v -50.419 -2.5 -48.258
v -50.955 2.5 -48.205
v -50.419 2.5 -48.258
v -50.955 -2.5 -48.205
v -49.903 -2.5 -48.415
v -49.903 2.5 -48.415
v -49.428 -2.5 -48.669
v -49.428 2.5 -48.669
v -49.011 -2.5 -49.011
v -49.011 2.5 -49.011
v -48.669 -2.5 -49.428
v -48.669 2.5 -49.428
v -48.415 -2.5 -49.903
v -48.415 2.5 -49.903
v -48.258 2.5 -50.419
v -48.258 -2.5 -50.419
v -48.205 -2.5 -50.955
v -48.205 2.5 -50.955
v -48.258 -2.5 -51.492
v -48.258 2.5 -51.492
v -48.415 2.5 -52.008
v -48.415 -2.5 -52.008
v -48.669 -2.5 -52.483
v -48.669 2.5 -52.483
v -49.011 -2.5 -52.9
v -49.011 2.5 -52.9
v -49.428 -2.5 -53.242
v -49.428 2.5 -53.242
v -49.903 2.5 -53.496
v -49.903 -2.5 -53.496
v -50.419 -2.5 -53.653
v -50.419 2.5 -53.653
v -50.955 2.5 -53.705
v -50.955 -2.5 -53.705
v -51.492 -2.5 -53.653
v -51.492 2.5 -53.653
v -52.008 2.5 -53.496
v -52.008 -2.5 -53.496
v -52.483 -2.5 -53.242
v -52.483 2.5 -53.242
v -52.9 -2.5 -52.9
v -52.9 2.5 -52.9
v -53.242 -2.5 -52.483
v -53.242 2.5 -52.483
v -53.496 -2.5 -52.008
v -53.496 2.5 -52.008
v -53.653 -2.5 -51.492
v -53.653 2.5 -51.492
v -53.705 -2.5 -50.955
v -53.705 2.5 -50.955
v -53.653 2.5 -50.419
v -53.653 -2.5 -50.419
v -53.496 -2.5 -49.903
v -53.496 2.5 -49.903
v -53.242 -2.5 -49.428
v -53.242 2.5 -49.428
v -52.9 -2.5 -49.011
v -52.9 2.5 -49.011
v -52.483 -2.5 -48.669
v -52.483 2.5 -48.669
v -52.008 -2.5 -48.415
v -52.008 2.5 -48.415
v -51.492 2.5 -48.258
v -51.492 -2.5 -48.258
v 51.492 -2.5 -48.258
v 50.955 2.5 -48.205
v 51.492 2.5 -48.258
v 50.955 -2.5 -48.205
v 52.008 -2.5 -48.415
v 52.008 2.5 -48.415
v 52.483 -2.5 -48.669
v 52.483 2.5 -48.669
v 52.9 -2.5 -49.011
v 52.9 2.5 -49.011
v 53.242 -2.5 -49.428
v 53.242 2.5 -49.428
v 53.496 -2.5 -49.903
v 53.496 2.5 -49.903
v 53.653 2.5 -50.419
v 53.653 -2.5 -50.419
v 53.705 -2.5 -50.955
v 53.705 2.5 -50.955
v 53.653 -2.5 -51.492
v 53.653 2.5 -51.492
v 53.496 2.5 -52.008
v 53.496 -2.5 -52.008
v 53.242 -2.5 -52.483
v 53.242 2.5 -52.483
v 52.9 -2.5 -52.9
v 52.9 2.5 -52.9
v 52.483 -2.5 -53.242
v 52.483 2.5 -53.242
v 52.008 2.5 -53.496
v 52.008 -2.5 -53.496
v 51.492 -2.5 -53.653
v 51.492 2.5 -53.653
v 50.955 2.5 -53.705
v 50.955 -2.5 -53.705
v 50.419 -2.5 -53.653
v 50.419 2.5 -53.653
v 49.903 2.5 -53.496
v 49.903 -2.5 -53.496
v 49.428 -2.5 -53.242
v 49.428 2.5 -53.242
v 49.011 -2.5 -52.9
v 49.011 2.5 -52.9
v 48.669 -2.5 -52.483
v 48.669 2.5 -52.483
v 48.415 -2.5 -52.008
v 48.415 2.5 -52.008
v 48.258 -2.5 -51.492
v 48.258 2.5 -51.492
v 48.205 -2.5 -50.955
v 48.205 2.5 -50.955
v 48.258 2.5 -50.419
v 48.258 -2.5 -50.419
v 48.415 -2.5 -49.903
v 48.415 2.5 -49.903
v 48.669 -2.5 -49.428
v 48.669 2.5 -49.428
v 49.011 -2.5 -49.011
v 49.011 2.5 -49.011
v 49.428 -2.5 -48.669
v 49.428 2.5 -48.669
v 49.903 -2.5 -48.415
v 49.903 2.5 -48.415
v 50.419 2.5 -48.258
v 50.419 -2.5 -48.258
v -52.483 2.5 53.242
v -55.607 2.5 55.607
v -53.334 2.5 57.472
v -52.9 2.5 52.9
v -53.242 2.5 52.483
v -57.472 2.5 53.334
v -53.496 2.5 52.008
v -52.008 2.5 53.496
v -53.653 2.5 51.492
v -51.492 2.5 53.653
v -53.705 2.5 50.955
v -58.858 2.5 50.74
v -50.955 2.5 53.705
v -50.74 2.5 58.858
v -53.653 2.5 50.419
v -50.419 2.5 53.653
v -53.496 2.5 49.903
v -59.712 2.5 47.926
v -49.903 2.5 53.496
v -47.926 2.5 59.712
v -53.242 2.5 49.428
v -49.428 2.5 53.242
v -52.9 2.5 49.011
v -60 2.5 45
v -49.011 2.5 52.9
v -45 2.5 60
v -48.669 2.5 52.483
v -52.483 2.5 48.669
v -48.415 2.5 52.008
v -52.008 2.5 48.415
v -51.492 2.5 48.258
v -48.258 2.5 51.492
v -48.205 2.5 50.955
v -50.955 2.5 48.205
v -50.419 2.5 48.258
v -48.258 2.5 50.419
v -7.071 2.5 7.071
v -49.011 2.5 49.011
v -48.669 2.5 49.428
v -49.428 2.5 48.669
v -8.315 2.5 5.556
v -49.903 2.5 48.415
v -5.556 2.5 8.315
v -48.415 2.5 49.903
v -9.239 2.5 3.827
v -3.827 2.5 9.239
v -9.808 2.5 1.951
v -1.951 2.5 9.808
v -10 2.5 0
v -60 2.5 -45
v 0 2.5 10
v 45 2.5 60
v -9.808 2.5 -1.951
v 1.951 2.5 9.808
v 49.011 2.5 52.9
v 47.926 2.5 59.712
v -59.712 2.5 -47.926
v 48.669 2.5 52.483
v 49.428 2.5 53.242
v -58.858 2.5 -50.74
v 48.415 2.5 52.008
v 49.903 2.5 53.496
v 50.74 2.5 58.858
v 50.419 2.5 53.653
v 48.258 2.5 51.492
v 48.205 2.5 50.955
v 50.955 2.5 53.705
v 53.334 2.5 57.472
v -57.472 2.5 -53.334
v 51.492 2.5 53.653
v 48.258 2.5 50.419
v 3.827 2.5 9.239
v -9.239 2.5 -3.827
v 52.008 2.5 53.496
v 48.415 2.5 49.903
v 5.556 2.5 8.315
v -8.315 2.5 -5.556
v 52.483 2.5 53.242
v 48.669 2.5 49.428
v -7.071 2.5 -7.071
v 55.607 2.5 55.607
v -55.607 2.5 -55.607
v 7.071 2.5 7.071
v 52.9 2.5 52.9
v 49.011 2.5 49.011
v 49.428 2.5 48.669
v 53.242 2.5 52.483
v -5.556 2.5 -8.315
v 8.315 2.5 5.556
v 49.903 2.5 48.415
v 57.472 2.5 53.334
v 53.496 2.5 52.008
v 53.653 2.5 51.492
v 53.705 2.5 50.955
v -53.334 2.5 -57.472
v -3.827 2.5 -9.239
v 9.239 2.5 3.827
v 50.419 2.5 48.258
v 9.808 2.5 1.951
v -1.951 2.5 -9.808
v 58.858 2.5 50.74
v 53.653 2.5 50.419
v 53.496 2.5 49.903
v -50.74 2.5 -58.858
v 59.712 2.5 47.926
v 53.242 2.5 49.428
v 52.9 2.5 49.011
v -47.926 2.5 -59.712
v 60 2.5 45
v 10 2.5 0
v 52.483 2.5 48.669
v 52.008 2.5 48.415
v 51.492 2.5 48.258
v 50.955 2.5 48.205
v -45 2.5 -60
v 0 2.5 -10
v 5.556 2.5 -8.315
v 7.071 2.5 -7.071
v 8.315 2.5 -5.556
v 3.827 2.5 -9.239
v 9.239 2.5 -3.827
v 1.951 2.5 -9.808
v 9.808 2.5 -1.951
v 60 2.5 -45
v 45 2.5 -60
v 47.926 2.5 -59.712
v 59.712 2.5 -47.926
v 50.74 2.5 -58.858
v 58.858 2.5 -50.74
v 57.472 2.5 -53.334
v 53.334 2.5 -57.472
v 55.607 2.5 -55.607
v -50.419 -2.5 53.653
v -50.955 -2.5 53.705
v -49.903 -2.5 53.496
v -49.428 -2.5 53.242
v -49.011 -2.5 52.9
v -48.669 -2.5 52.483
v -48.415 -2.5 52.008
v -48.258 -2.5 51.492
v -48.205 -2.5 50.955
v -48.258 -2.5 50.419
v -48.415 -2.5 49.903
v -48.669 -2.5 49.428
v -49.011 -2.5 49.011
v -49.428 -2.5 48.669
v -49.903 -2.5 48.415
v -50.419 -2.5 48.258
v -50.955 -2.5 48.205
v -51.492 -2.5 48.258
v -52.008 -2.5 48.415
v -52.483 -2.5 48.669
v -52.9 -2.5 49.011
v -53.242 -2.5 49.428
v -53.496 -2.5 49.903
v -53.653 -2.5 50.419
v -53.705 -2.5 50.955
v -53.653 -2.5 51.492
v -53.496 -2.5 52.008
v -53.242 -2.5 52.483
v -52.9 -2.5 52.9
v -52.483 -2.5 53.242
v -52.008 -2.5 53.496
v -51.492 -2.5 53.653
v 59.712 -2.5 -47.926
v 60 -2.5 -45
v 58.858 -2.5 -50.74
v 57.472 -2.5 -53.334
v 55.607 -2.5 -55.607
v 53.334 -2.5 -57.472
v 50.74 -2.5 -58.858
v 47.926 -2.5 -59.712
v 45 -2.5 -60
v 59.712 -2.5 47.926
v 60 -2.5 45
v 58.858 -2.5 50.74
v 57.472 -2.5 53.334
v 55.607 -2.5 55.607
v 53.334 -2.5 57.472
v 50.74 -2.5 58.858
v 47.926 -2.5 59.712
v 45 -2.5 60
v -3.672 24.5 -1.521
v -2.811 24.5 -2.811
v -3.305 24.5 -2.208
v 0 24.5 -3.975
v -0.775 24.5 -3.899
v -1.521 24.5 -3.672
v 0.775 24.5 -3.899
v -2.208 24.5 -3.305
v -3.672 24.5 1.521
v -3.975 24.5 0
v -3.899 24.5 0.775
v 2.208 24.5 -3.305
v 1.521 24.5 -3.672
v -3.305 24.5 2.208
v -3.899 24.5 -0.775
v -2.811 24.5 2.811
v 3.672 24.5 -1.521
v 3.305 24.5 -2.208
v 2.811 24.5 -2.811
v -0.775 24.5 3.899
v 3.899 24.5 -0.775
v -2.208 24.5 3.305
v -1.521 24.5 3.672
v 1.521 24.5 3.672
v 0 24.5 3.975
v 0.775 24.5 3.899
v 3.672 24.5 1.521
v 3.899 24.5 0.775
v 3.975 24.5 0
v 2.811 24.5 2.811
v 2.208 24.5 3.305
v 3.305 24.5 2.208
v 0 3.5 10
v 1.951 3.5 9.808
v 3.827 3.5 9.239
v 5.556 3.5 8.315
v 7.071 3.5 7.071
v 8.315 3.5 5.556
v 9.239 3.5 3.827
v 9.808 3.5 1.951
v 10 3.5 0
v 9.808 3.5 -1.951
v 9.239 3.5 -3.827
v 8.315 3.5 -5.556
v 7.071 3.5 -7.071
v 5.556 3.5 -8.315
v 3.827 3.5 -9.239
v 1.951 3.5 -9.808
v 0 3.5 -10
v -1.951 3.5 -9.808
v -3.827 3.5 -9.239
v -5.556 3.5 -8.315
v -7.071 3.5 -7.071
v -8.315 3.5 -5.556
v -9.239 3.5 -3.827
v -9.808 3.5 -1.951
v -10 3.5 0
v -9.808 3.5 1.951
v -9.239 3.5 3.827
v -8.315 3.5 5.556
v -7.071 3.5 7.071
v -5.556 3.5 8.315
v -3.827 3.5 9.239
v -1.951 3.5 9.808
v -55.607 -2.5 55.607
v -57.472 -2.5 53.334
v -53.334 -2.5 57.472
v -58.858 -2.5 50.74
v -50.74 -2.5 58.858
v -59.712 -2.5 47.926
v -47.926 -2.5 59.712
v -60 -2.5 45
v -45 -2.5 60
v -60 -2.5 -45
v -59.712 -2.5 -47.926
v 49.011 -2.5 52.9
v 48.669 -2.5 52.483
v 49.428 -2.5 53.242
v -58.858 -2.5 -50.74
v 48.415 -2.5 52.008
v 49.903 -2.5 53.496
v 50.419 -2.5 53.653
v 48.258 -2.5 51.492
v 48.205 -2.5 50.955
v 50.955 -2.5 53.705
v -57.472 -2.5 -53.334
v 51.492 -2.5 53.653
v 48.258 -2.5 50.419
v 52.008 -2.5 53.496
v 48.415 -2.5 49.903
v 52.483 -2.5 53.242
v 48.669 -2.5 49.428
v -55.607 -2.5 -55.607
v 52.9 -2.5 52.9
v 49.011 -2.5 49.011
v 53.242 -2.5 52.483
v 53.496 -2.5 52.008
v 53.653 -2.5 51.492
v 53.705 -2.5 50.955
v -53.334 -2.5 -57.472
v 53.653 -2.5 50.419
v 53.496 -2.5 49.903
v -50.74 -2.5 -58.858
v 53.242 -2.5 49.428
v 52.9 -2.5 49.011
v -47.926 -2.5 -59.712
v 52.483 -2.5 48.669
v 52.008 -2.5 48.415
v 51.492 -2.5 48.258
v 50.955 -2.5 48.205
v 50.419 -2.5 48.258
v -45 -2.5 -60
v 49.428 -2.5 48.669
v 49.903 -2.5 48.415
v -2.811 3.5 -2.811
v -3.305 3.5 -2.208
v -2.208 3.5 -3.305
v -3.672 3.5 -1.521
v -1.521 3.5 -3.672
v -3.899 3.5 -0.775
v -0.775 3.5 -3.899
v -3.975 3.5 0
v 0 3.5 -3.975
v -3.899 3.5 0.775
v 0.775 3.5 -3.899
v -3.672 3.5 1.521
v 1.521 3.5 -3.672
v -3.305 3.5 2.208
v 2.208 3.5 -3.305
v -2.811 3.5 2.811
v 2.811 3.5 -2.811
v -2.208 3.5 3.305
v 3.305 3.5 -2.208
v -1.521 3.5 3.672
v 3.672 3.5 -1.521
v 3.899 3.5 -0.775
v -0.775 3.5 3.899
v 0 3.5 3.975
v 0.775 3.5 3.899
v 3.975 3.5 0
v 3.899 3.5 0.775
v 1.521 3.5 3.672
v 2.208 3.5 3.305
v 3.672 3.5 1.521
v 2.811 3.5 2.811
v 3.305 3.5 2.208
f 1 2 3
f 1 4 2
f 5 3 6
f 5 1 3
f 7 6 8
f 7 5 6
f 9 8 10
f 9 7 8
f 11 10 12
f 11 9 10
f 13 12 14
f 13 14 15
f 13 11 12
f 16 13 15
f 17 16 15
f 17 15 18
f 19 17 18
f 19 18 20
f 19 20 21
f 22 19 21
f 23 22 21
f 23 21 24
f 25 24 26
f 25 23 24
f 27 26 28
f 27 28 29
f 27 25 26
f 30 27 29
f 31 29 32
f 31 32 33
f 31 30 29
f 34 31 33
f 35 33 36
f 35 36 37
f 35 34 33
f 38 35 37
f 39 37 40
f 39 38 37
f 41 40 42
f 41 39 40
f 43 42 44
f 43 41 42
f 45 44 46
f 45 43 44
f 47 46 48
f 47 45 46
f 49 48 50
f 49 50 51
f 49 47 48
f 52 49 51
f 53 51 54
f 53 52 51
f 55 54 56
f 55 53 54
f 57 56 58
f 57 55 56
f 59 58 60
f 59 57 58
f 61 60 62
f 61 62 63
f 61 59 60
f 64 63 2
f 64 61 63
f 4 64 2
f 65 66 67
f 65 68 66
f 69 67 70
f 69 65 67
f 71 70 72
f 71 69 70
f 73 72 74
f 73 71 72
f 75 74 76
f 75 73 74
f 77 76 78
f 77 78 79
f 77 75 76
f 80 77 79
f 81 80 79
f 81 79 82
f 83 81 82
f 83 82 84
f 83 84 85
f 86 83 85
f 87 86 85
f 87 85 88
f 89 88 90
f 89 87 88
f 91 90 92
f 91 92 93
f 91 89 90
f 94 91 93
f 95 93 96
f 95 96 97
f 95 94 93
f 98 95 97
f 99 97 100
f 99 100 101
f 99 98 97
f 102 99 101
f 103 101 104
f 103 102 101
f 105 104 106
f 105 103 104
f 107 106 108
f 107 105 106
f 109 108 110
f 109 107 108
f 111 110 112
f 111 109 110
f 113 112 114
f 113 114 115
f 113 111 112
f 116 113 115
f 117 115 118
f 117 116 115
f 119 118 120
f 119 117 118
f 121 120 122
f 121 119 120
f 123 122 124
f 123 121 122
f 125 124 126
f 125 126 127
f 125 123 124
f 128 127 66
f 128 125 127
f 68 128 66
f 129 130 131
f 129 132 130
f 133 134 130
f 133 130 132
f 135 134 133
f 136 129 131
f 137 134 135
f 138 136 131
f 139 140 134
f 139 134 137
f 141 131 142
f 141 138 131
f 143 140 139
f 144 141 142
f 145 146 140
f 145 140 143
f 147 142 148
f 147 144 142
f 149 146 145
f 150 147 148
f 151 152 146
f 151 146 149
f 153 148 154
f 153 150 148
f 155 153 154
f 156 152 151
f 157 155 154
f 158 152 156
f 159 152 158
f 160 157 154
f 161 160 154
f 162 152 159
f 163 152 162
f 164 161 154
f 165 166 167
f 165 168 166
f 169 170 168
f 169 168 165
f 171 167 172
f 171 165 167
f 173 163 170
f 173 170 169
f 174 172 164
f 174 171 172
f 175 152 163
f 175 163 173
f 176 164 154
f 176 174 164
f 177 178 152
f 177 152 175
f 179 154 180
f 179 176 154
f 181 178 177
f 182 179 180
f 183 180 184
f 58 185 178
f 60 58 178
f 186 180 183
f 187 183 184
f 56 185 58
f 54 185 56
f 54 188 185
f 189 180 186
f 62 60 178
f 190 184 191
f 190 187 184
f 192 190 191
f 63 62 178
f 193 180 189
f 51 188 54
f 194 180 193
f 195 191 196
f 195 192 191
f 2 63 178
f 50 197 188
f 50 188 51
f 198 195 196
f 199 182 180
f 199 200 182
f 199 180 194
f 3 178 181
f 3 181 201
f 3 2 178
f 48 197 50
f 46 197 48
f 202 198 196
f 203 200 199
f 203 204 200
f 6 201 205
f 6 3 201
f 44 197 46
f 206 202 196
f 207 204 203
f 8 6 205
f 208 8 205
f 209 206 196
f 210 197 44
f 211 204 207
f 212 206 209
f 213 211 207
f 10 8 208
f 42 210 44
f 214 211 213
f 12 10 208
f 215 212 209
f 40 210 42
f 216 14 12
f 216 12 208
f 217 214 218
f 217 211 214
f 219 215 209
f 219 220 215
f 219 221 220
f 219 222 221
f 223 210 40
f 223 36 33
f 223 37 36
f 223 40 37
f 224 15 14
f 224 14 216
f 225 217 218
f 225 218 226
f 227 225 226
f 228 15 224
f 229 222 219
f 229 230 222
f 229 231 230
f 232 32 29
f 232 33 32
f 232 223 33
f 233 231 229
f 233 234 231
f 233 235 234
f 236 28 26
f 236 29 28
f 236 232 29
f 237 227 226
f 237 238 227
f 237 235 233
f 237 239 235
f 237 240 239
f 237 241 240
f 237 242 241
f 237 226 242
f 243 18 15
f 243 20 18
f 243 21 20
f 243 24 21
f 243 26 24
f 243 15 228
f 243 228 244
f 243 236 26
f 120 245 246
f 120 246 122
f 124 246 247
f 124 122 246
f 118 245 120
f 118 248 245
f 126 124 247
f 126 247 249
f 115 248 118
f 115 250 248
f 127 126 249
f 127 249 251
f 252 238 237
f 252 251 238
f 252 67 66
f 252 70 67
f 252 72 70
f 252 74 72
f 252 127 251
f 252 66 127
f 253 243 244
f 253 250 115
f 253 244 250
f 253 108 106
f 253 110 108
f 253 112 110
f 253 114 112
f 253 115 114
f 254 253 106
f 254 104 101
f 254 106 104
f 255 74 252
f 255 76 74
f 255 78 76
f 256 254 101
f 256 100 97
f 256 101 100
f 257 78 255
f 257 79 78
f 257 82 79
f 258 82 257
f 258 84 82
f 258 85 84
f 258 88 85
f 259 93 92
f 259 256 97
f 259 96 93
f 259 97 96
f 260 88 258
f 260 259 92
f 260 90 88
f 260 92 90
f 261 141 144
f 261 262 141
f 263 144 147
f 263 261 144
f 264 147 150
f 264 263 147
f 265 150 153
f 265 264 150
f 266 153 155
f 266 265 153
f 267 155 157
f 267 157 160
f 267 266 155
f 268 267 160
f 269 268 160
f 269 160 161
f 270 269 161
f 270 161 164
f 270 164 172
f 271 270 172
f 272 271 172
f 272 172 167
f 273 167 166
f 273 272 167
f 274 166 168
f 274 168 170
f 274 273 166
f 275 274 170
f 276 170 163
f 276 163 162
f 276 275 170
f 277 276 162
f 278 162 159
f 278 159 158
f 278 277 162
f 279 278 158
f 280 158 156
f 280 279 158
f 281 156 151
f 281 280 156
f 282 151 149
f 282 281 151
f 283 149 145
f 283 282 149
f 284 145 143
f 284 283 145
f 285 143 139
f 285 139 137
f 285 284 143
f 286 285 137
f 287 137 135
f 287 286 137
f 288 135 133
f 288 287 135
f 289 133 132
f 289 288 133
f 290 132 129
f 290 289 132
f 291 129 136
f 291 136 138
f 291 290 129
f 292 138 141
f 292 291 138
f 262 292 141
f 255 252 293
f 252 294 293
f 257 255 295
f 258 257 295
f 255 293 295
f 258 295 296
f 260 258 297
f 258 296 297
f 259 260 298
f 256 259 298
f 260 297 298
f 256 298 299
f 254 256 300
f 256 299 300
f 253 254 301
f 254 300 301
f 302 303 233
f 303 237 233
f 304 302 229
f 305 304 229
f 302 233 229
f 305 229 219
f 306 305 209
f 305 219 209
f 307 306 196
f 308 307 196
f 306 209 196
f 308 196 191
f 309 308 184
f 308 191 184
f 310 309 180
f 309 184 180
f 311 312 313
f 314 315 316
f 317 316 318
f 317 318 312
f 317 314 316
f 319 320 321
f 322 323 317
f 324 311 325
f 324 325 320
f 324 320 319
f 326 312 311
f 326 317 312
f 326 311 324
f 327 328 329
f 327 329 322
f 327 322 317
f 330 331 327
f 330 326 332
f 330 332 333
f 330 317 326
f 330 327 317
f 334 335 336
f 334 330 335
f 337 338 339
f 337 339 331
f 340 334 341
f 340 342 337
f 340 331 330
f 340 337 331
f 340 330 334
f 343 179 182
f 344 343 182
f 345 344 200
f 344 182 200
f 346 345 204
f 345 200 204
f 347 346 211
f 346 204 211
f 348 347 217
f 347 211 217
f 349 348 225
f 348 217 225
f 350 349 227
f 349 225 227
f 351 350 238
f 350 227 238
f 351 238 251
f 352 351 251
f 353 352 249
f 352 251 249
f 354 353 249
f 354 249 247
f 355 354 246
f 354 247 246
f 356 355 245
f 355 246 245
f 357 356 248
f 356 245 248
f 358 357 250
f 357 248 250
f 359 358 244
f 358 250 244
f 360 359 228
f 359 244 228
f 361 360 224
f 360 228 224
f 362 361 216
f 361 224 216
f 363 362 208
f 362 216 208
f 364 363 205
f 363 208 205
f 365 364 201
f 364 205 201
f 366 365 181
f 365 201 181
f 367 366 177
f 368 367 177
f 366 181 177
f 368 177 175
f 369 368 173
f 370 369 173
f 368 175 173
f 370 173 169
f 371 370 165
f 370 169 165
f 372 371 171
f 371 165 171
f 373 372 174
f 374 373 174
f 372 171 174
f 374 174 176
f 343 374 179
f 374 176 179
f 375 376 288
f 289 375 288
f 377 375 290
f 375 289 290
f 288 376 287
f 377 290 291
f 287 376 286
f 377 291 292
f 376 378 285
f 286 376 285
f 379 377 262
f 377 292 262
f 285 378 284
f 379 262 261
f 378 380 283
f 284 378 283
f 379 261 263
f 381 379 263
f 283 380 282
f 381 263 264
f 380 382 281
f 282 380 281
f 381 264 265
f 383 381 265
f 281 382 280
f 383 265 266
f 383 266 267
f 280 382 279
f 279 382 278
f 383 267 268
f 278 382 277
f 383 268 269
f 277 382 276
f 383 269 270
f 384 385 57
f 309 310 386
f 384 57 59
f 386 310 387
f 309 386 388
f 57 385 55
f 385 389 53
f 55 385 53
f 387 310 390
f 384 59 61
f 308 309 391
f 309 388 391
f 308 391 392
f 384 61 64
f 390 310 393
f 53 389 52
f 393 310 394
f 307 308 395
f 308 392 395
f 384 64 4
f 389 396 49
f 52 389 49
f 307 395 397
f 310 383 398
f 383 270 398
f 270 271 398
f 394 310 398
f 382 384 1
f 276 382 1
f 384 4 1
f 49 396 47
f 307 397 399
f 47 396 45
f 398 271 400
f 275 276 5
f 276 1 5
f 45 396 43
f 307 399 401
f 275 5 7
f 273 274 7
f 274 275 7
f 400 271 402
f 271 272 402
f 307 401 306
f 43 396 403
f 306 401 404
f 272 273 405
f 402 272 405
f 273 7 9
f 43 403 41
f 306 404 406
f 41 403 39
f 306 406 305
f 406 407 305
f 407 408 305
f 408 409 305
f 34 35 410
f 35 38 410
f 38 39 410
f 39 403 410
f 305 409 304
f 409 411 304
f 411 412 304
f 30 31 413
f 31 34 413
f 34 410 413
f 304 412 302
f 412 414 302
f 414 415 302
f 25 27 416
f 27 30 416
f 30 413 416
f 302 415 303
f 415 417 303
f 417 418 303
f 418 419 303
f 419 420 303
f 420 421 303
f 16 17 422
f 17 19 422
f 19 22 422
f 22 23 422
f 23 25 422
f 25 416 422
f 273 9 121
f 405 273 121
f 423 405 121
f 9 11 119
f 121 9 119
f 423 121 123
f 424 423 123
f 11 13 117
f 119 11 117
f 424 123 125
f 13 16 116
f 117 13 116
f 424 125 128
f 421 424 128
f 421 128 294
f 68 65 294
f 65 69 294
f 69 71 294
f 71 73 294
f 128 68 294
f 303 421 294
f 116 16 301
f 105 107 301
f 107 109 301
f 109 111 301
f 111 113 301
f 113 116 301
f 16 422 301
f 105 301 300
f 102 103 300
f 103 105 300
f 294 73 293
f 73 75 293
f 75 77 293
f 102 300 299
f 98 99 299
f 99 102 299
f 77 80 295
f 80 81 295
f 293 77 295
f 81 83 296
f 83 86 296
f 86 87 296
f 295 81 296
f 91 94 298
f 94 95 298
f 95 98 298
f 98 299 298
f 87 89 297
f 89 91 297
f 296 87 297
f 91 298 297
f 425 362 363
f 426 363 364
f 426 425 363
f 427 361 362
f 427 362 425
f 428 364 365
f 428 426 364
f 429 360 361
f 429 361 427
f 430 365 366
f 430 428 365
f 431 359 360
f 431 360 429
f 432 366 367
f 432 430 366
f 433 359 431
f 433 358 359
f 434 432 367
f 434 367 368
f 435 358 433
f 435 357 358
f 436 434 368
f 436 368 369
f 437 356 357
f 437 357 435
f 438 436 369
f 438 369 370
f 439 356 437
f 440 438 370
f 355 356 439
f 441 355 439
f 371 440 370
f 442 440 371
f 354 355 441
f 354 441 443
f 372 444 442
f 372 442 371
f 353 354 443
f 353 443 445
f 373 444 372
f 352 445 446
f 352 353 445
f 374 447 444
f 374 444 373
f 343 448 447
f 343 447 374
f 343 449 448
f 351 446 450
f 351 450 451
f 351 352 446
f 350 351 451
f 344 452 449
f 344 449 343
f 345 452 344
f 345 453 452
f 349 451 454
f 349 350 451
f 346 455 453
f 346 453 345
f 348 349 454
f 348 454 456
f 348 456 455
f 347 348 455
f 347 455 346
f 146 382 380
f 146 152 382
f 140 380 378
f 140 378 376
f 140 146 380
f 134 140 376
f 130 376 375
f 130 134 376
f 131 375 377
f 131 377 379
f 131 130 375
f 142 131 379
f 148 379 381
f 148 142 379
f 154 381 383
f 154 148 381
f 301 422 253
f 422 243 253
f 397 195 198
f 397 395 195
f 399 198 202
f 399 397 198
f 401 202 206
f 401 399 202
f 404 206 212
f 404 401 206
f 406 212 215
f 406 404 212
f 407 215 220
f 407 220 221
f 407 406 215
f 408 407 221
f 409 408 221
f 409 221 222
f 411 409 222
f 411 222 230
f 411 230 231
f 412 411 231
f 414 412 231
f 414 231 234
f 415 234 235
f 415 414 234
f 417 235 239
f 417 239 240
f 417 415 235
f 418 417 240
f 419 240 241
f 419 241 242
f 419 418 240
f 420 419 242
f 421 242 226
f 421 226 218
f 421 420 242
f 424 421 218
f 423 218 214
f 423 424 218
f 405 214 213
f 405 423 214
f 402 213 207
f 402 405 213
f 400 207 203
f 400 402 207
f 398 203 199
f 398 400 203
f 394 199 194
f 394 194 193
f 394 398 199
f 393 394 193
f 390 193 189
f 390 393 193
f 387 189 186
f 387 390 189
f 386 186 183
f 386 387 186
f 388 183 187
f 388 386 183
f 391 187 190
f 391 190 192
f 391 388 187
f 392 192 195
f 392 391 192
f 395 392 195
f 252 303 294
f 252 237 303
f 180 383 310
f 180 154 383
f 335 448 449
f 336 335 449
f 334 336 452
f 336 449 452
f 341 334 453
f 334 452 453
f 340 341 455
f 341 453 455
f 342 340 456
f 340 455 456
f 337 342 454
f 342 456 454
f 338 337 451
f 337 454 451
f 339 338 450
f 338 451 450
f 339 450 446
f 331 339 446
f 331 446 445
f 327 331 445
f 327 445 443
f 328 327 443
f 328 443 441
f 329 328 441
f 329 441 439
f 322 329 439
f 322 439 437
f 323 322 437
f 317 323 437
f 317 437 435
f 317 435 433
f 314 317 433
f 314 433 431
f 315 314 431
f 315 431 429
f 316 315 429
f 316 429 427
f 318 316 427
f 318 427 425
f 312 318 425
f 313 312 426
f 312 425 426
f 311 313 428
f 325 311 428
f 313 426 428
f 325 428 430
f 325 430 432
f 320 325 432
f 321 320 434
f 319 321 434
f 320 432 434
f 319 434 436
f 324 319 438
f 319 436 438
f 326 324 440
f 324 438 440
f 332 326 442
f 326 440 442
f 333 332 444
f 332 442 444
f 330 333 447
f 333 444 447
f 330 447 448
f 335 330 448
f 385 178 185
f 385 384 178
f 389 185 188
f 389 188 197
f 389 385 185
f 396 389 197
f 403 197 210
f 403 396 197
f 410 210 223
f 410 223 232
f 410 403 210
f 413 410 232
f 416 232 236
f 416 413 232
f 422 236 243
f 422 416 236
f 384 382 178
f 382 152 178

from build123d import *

# Parameters (mm, degrees)
ESBO_O1_W                = 120
ESBO_O1_H                = 120
ESBO_O1_R                = 2.75
RESSALTO_EXTRUS_O1_DEPTH = 2.5
FILETE1_R                = 15
ESBO_O2_R                = 3.975
RESSALTO_EXTRUS_O2_DEPTH = 22
ESBO_O3_R                = 10
RESSALTO_EXTRUS_O3_DEPTH = 1


with BuildPart() as part:
    # Esboço1 → Ressalto-extrusão1 (new, symmetric)
    with BuildSketch(Plane(origin=(0, 0, 0), x_dir=(1, 0, 0), z_dir=(0, 1, 0))):
        Rectangle(ESBO_O1_W, ESBO_O1_H)
        with Locations(Location((-50.955395397, -50.955395397, 0), (0, 0, 270))):
            Circle(ESBO_O1_R, mode=Mode.SUBTRACT)
        with Locations(Location((-50.955395397, 50.955395397, 0), (0, 0, 270))):
            Circle(ESBO_O1_R, mode=Mode.SUBTRACT)
        with Locations(Location((50.955395397, 50.955395397, 0), (0, 0, 270))):
            Circle(ESBO_O1_R, mode=Mode.SUBTRACT)
        with Locations(Location((50.955395397, -50.955395397, 0), (0, 0, 270))):
            Circle(ESBO_O1_R, mode=Mode.SUBTRACT)
    extrude(amount=RESSALTO_EXTRUS_O1_DEPTH, both=True)

    # Filete1
    filete1_edges = [part.edges().sort_by_distance(p)[0] for p in [
        (-60, 0, 60),
        (-60, 0, -60),
        (60, 0, -60),
        (60, 0, 60),
    ]]
    fillet(filete1_edges, radius=FILETE1_R)

    # Esboço2 → Ressalto-extrusão2 (add)
    with BuildSketch(Plane(origin=(0, 2.5, 0), x_dir=(1, 0, 0), z_dir=(0, 1, 0))):
        with Locations(Location((0, 0, 0), (0, 0, 270))):
            Circle(ESBO_O2_R)
    extrude(amount=RESSALTO_EXTRUS_O2_DEPTH)

    # Esboço3 → Ressalto-extrusão3 (add)
    with BuildSketch(Plane(origin=(0, 2.5, 0), x_dir=(1, 0, 0), z_dir=(0, 1, 0))):
        with Locations(Location((0, 0, 0), (0, 0, 270))):
            Circle(ESBO_O3_R)
    extrude(amount=RESSALTO_EXTRUS_O3_DEPTH)


solid = part.part
